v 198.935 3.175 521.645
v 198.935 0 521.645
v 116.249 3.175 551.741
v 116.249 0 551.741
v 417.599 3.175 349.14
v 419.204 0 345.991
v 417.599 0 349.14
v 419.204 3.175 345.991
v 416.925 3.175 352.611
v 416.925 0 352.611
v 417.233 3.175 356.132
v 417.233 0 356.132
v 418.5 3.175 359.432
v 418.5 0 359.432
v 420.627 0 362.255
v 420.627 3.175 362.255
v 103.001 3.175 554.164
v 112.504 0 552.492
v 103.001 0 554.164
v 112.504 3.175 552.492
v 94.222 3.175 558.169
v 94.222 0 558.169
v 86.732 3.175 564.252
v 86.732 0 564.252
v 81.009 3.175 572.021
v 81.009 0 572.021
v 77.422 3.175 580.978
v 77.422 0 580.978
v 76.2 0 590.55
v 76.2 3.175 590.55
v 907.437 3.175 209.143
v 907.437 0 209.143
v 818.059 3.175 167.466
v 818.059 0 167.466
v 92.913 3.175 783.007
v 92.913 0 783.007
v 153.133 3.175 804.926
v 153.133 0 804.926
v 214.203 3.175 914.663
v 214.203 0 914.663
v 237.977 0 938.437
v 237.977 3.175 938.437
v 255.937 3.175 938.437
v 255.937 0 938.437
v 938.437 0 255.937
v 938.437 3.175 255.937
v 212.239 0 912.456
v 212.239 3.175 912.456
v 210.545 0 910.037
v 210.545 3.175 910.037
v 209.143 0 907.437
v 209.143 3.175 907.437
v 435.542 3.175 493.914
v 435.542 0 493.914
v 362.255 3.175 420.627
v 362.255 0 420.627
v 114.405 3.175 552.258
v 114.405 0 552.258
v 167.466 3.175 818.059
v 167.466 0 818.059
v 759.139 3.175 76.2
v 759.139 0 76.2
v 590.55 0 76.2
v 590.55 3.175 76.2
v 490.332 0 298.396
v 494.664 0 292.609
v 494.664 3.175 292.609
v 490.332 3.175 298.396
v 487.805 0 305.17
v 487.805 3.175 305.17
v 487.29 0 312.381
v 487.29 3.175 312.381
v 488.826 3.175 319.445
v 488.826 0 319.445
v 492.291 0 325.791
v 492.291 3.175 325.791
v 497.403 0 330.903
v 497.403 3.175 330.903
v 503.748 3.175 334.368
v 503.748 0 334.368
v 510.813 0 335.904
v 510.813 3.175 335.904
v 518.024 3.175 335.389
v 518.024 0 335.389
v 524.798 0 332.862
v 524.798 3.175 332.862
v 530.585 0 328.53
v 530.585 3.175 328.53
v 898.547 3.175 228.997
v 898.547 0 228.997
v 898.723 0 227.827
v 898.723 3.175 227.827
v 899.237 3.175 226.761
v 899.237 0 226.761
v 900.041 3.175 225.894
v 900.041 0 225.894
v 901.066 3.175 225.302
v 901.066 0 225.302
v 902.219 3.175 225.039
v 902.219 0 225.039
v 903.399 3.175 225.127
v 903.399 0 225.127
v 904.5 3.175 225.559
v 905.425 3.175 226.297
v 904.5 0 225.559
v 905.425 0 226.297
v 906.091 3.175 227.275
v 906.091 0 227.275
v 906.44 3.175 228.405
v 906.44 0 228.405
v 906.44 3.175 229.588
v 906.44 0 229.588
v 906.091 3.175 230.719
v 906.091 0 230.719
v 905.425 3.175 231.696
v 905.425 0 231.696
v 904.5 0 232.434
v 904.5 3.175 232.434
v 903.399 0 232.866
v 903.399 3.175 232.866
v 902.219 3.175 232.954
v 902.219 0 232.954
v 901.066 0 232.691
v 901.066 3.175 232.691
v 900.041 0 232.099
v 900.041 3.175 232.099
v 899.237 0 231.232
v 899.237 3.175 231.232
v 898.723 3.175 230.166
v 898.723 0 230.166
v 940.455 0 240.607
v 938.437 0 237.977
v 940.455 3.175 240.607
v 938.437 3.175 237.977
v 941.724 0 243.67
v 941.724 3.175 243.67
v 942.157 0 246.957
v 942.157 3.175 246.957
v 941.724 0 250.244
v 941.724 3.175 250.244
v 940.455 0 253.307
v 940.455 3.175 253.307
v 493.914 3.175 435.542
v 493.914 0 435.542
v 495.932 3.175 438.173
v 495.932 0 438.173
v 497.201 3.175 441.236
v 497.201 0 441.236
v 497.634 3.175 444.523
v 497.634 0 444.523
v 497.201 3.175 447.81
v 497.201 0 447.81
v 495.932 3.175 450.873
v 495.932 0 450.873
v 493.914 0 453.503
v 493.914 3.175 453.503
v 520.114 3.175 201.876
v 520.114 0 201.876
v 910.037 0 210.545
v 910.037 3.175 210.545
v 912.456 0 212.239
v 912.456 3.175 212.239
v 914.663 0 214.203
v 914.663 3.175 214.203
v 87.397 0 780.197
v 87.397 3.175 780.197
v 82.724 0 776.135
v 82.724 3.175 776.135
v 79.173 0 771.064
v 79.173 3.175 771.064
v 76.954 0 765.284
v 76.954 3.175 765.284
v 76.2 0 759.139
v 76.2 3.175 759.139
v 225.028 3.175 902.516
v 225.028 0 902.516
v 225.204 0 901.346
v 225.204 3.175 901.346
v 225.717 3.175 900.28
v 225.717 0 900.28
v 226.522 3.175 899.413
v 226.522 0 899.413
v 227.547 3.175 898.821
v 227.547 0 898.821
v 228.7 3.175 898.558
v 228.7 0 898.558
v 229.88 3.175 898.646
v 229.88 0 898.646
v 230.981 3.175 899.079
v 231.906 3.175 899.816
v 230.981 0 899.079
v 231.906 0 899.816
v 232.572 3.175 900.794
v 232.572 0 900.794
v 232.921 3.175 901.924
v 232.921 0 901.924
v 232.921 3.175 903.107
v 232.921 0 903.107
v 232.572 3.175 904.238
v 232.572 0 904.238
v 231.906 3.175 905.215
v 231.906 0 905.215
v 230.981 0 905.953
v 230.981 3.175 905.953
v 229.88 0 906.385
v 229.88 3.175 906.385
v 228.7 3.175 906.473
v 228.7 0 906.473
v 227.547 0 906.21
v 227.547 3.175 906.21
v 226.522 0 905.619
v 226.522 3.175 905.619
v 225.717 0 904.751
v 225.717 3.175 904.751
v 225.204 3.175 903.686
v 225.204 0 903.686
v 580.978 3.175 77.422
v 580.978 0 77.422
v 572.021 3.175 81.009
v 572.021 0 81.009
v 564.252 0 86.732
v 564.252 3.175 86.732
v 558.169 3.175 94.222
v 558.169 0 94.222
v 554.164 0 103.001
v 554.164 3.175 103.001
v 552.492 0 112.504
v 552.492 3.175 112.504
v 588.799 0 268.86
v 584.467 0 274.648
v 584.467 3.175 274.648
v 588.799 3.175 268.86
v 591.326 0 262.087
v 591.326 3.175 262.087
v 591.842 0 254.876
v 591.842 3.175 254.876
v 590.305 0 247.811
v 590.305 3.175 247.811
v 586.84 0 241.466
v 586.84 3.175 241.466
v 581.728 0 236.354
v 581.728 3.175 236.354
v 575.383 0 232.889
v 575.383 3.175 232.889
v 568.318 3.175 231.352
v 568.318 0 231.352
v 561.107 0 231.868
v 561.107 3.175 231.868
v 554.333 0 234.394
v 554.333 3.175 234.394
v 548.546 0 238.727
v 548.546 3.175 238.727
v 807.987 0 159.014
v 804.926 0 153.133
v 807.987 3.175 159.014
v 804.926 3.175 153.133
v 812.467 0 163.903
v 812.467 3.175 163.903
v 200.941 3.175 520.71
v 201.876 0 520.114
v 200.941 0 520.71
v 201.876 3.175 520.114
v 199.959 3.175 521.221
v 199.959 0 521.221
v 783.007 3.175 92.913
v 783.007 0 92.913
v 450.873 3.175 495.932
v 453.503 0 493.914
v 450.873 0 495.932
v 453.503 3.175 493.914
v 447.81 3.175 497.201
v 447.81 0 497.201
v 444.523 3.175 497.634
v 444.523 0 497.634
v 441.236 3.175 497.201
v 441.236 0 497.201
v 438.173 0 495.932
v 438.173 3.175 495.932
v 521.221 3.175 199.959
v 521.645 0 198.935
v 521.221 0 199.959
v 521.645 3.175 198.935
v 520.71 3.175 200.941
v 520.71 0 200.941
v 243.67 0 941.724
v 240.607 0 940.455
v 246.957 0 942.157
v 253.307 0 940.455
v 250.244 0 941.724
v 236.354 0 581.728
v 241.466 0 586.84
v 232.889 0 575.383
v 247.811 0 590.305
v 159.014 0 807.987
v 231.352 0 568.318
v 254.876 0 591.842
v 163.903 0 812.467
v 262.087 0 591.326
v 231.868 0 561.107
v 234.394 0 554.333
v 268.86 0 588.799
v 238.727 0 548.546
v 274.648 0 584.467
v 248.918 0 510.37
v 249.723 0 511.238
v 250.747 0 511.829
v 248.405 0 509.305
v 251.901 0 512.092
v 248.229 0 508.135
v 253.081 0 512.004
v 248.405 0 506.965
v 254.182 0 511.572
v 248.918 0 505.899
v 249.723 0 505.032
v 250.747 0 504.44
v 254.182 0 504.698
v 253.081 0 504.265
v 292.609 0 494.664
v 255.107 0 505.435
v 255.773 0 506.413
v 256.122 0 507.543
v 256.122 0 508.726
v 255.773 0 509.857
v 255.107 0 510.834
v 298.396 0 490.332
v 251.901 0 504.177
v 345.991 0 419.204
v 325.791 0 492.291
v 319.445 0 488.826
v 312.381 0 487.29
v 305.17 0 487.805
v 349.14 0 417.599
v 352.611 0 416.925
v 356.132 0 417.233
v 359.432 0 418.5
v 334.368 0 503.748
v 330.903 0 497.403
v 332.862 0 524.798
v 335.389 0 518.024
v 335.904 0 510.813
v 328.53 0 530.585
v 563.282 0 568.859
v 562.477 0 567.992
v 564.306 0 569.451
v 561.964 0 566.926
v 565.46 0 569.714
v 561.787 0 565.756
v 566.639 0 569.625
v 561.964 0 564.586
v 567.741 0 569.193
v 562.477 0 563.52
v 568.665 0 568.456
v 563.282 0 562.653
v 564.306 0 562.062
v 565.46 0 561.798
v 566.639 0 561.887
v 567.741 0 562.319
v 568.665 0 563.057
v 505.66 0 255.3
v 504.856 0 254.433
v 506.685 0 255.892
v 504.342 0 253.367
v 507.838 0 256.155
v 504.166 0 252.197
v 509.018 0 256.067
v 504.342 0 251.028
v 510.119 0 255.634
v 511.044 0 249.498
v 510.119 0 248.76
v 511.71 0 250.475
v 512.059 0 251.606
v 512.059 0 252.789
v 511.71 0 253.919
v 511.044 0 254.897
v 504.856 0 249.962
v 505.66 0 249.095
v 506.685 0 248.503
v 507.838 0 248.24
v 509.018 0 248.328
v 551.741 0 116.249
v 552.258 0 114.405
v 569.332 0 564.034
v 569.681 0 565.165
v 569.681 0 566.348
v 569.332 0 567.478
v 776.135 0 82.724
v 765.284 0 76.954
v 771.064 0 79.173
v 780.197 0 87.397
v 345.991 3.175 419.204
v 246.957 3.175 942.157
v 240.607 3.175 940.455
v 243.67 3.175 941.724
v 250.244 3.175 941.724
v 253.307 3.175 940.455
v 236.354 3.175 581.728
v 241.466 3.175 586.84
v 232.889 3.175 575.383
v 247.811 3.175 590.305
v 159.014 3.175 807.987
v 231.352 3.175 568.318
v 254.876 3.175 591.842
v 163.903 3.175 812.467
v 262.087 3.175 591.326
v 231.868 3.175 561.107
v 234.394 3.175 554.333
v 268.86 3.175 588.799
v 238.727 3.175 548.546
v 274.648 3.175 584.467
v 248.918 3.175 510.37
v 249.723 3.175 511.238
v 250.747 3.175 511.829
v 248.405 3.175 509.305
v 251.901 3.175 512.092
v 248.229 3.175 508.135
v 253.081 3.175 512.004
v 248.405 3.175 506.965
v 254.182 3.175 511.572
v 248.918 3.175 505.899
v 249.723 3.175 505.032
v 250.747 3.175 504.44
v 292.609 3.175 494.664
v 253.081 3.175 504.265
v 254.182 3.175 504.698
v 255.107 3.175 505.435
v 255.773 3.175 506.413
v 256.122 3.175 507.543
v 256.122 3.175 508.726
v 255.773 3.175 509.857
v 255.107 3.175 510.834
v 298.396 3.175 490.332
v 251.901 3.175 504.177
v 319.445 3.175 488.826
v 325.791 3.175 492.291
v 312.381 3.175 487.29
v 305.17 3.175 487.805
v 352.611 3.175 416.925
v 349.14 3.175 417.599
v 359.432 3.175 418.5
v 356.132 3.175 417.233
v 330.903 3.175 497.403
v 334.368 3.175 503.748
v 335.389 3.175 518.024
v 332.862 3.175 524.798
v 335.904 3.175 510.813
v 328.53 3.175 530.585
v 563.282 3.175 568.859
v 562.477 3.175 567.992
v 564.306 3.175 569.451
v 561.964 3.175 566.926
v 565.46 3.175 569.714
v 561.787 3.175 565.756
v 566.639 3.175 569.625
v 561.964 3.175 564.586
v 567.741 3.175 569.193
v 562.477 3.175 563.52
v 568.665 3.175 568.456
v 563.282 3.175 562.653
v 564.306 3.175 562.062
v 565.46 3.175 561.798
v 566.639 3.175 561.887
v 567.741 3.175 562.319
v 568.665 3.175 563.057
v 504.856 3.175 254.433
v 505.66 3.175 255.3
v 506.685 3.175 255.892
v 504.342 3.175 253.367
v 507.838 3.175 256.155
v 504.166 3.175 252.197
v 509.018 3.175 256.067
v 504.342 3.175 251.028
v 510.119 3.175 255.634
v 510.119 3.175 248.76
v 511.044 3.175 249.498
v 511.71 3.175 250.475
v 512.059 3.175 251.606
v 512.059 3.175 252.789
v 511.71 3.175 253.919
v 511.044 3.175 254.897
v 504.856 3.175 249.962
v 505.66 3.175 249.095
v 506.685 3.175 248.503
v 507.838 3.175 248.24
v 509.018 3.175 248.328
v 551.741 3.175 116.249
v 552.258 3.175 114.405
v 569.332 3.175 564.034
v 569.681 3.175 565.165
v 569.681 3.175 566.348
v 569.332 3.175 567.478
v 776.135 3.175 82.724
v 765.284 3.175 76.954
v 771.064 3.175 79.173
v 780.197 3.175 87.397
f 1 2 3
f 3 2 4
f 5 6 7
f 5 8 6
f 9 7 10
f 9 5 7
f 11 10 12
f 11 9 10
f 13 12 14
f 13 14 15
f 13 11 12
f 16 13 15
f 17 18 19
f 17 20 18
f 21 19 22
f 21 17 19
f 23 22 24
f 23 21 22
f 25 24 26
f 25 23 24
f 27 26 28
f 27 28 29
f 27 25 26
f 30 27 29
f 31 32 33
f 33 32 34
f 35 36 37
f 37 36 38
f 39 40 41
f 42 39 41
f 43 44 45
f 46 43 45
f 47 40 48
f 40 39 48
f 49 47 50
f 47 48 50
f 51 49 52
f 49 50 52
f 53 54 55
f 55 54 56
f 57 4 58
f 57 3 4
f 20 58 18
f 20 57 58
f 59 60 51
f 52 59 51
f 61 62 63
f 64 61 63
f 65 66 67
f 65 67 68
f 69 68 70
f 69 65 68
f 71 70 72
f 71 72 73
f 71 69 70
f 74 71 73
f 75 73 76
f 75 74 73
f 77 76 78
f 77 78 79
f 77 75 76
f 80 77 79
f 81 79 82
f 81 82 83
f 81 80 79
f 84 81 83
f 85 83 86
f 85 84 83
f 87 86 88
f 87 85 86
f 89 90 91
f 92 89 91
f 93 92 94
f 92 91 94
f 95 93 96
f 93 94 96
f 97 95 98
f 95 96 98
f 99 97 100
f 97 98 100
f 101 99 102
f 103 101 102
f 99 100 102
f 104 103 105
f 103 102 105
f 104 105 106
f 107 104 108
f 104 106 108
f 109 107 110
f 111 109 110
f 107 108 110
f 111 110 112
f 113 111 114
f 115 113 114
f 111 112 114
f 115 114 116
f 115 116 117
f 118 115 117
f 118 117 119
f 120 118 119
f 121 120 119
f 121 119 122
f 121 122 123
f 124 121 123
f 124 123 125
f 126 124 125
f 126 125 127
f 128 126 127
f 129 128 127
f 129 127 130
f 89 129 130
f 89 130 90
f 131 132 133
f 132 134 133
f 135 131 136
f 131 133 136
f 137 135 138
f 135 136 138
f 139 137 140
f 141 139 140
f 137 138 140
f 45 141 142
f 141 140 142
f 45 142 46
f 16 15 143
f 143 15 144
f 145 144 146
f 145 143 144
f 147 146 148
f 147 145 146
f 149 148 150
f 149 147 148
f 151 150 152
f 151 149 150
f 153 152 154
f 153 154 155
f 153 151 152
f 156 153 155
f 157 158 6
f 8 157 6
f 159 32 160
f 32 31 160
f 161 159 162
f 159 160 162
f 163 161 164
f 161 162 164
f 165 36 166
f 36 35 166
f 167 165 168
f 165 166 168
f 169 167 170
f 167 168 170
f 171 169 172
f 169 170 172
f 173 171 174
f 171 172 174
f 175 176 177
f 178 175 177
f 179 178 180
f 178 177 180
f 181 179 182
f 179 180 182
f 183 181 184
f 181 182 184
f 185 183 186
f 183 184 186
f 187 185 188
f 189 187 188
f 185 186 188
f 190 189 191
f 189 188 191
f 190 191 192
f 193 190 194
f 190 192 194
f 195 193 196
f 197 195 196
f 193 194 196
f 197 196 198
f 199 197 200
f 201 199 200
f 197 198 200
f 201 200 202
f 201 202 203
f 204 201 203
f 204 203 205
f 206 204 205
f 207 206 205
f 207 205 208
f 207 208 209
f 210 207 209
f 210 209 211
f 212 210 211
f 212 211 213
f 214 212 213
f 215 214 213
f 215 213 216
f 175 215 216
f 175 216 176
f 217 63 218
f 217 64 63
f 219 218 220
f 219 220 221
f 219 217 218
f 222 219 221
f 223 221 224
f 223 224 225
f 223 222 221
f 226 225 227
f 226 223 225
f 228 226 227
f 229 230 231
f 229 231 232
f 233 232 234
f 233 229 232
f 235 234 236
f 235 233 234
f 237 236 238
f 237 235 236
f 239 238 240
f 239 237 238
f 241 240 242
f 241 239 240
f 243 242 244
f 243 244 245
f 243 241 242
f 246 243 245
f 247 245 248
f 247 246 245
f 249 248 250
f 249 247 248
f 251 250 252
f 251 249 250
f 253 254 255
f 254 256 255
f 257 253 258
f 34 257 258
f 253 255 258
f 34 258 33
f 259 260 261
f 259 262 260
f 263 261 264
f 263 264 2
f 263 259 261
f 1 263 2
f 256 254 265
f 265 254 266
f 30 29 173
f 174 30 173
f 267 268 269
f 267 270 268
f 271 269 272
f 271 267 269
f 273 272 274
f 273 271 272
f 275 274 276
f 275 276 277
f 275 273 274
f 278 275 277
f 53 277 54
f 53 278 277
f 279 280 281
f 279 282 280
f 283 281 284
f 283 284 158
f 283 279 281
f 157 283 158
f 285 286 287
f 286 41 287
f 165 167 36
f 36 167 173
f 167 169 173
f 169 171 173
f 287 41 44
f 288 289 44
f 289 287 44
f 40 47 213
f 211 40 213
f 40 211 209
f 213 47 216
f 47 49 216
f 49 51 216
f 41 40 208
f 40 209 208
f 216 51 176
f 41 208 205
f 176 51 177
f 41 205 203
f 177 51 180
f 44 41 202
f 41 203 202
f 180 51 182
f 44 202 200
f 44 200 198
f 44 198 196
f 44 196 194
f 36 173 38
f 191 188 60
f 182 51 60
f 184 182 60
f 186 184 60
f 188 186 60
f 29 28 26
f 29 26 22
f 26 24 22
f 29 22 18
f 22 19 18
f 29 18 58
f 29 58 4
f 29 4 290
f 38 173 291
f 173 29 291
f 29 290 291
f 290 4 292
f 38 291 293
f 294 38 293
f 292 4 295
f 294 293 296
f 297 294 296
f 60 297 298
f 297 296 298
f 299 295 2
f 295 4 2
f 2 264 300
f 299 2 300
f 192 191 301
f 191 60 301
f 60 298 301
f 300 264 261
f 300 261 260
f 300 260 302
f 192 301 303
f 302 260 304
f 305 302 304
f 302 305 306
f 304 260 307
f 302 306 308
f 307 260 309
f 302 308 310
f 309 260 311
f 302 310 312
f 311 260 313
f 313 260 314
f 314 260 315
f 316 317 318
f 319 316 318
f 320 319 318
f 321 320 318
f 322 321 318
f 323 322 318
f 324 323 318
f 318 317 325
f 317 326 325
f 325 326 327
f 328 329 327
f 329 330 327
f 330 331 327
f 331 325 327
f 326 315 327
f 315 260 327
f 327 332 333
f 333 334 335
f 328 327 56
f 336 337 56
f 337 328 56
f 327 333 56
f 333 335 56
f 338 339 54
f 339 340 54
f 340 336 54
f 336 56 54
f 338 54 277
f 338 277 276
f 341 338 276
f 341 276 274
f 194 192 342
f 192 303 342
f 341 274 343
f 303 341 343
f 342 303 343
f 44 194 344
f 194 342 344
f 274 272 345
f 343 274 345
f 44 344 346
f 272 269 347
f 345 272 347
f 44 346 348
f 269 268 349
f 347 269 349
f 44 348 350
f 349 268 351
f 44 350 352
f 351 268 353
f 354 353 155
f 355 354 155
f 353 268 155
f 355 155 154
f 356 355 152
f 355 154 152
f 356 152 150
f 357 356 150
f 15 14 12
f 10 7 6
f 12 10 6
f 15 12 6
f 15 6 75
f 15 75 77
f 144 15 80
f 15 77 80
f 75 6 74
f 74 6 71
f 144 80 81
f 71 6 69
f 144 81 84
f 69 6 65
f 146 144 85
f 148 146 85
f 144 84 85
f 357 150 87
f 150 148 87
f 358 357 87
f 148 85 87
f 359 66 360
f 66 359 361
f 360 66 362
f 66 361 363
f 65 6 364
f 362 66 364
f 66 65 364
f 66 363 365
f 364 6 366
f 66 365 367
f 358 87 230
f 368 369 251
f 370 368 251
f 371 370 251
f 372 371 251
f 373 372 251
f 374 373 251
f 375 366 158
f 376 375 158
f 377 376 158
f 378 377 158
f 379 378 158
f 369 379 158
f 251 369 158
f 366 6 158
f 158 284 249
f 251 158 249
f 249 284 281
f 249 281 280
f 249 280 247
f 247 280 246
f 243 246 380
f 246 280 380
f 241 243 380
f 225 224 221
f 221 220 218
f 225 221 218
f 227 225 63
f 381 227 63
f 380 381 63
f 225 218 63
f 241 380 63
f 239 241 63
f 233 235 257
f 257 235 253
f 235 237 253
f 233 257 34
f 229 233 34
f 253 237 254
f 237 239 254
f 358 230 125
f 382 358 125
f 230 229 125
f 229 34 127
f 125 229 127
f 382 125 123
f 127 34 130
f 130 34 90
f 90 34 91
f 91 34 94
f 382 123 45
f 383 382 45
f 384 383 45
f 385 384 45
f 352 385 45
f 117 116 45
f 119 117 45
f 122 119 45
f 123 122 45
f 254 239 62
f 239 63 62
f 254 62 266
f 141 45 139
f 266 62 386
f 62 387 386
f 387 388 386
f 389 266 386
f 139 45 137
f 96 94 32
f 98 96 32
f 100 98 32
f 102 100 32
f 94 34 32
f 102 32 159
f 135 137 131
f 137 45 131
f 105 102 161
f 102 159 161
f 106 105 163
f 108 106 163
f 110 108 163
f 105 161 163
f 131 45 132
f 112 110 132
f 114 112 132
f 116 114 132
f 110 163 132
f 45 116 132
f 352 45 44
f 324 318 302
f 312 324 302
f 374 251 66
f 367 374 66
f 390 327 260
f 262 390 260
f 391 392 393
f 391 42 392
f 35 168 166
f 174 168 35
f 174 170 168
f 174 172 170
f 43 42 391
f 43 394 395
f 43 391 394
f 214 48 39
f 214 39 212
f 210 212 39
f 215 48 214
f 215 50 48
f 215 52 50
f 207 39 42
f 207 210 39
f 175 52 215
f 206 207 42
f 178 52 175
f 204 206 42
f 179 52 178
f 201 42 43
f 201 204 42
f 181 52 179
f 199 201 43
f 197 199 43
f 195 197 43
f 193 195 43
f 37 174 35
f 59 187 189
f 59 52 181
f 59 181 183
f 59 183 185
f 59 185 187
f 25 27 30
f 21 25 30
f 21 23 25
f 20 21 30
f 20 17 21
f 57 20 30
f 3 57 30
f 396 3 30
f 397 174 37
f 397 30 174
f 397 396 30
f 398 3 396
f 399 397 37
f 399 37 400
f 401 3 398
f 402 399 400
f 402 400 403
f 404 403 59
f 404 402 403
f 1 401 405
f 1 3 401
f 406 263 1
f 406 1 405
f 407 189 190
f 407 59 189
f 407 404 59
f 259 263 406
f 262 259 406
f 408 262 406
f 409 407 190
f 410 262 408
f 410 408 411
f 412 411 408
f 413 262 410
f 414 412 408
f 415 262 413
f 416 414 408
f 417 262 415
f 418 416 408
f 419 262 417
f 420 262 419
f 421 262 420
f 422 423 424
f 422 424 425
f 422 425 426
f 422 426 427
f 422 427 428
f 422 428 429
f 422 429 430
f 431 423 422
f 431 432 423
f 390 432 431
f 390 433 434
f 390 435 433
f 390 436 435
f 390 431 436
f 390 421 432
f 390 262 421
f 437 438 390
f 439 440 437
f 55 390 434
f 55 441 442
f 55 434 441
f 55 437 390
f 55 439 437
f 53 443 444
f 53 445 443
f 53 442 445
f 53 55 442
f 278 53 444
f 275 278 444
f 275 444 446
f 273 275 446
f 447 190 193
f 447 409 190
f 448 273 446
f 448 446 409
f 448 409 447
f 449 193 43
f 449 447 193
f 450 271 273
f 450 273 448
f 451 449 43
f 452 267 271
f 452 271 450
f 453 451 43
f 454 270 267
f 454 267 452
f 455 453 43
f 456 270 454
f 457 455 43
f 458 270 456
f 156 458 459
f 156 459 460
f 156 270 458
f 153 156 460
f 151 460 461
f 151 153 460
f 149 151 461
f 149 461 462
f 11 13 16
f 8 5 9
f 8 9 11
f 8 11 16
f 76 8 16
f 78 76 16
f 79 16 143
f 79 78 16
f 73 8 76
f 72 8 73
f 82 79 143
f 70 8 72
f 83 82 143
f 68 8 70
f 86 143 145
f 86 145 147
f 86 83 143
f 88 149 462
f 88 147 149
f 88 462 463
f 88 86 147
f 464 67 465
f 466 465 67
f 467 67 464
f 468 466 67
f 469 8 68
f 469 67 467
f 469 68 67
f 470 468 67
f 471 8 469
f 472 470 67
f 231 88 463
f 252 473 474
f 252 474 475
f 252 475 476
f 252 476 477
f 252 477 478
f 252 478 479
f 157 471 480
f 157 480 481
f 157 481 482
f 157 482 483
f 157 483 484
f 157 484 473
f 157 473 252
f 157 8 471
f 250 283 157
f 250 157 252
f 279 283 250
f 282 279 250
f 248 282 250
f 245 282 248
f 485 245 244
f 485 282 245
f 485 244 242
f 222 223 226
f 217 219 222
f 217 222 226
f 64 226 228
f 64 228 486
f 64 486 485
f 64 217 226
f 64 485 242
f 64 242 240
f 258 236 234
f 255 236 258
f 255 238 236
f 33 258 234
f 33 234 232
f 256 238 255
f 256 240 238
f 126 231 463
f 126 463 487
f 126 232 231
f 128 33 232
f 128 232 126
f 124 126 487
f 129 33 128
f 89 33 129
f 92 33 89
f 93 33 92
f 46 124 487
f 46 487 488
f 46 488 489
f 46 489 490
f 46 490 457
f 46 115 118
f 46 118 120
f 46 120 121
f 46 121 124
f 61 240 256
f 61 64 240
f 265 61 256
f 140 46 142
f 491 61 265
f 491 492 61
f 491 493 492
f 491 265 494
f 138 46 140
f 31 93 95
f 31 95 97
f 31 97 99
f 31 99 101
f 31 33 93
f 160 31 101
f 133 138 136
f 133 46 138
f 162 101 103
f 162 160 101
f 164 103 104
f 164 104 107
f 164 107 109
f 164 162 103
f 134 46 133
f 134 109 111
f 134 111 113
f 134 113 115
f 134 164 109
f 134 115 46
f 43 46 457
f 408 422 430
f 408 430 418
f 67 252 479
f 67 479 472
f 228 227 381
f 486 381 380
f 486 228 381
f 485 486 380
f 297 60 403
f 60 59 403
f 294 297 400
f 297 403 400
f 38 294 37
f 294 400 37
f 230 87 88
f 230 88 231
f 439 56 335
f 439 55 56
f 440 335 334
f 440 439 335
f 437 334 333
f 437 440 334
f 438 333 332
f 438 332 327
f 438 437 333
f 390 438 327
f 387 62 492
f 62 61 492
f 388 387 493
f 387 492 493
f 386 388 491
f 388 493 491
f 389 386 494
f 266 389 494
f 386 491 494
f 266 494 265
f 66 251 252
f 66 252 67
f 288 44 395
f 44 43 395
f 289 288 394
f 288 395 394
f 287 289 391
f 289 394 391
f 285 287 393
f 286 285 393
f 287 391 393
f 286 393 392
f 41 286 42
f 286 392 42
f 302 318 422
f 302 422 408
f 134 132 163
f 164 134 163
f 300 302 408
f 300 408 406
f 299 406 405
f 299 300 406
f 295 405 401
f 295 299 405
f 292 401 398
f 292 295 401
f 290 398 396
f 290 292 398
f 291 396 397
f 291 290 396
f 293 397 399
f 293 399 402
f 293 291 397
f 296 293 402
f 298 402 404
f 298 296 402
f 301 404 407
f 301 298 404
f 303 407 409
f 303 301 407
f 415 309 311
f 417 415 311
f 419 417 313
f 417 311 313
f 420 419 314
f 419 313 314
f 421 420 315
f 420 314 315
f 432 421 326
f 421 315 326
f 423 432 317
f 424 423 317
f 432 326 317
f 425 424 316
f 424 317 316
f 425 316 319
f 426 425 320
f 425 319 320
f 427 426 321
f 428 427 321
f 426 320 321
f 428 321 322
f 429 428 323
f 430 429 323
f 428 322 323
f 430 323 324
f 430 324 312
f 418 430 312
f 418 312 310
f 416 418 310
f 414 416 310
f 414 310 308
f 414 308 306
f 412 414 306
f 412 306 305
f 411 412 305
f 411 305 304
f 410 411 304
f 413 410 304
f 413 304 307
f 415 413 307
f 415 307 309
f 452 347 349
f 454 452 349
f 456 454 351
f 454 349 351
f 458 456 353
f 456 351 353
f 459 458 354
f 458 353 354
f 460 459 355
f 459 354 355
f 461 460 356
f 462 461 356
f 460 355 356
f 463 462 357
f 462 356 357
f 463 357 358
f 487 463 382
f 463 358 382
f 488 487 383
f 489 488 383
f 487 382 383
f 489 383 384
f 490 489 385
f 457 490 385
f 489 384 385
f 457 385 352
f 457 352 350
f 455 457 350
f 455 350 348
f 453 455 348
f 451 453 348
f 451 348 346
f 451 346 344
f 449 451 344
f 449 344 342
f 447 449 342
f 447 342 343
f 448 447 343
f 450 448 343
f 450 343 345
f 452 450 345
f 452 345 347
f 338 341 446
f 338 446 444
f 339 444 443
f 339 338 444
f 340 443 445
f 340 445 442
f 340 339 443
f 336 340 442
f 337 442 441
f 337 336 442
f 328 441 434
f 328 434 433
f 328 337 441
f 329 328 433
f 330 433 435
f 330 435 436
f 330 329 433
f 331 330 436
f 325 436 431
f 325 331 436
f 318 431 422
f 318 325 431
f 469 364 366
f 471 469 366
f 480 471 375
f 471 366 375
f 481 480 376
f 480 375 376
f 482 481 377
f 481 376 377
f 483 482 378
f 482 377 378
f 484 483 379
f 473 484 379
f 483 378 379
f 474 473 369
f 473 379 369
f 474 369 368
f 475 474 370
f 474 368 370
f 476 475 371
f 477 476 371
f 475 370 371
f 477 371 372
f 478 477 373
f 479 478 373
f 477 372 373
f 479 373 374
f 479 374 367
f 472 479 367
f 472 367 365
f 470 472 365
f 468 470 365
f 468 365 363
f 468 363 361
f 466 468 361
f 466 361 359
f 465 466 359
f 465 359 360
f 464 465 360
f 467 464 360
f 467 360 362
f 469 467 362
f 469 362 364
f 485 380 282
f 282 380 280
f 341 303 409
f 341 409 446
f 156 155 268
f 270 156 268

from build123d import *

# Parameters (mm, degrees)
BOSS_EXTRUDE1_DEPTH         = 3.175
FILLET3_R                   = 38.1
F_5_16_0_3125_DOWEL_HOLE1_D = 7.9375
F_1_2_DOWEL_SLOT1_DEPTH     = 3.175
FILLET4_R                   = 25.4
FILLET6_R                   = 12.7


# Read off the part's stored shape, not the designer's step: 1 (2) Dowel Slot1
with BuildPart() as part:
    # Sketch1 → Boss-Extrude1 (new body)
    with BuildSketch(Plane(origin=(0, 0, 0), x_dir=(1, 0, 0), z_dir=(0, 1, 0))):
        Polygon((246.957043329, -947.417020773), (947.417020773, -246.957043329), (911.495996289, -211.036018845), (808.524005584, -163.019391004), (776.924331502, -76.2), (552.45, -76.2), (552.45, -114.3), (521.073488184, -200.506257716), (413.091781569, -354.720116782), (502.89434278, -444.522677993), (444.522677993, -502.89434278), (354.720116782, -413.091781569), (200.506257716, -521.073488184), (114.3, -552.45), (76.2, -552.45), (76.2, -776.924331502), (163.019391004, -808.524005584), (211.036018845, -911.495996289), align=None)
    extrude(amount=BOSS_EXTRUDE1_DEPTH)

    # Fillet3
    fillet3_edges = [part.edges().sort_by_distance(p)[0] for p in [
        (76.2, 1.5875, 552.45),
        (552.45, 1.5875, 76.2),
    ]]
    fillet(fillet3_edges, radius=FILLET3_R - 0.0001)  # a hair under: the kernel refuses the full size

    # 5/16 (0.3125) Dowel Hole1 (through all)
    with Locations(Plane(origin=(0, 3.175, 0), x_dir=(1, 0, 0), z_dir=(0, 1, 0))):
        with Locations((252.197410095, -508.134709545), (508.134709545, -252.197410095), (902.515740167, -228.996531087), (228.996531087, -902.515740167), (565.756135627, -565.756135627)):
            Hole(F_5_16_0_3125_DOWEL_HOLE1_D / 2)

    # 1 (2) Dowel Slot1 outline → 1 (2) Dowel Slot1 (cut)
    with BuildSketch(Plane(origin=(0, 0, 0), x_dir=(1, 0, 0), z_dir=(0, 1, 0))):
        with BuildLine():
            Line((530.585349848, -328.529587124), (584.466886574, -274.648050397))
            ThreePointArc((584.466886574, -274.648050397), (584.466886574, -238.727025913), (548.54586209, -238.727025913))
            Line((548.54586209, -238.727025913), (494.664325364, -292.60856264))
            ThreePointArc((494.664325364, -292.60856264), (494.664325364, -328.529587124), (530.585349848, -328.529587124))
        make_face()
        with BuildLine():
            ThreePointArc((328.529587124, -530.585349848), (328.529587124, -494.664325364), (292.60856264, -494.664325364))
            Line((292.60856264, -494.664325364), (238.727025913, -548.54586209))
            ThreePointArc((238.727025913, -548.54586209), (238.727025913, -584.466886574), (274.648050397, -584.466886574))
            Line((274.648050397, -584.466886574), (328.529587124, -530.585349848))
        make_face()
    extrude(amount=F_1_2_DOWEL_SLOT1_DEPTH, mode=Mode.SUBTRACT)

    # Fillet4
    fillet4_edges = [part.edges().sort_by_distance(p)[0] for p in [
        (211.036018845, 1.5875, 911.495996289),
        (163.019391004, 1.5875, 808.524005584),
        (76.2, 1.5875, 776.924331502),
        (776.924331502, 1.5875, 76.2),
        (808.524005584, 1.5875, 163.019391004),
        (911.495996289, 1.5875, 211.036018845),
    ]]
    fillet(fillet4_edges, radius=FILLET4_R)

    # Fillet6
    fillet6_edges = [part.edges().sort_by_distance(p)[0] for p in [
        (947.417020773, 1.5875, 246.957043329),
        (246.957043329, 1.5875, 947.417020773),
        (114.3, 1.5875, 552.45),
        (200.506257716, 1.5875, 521.073488184),
        (354.720116782, 1.5875, 413.091781569),
        (444.522677993, 1.5875, 502.89434278),
        (502.89434278, 1.5875, 444.522677993),
        (413.091781569, 1.5875, 354.720116782),
        (521.073488184, 1.5875, 200.506257716),
        (552.45, 1.5875, 114.3),
    ]]
    fillet(fillet6_edges, radius=FILLET6_R)


solid = part.part
